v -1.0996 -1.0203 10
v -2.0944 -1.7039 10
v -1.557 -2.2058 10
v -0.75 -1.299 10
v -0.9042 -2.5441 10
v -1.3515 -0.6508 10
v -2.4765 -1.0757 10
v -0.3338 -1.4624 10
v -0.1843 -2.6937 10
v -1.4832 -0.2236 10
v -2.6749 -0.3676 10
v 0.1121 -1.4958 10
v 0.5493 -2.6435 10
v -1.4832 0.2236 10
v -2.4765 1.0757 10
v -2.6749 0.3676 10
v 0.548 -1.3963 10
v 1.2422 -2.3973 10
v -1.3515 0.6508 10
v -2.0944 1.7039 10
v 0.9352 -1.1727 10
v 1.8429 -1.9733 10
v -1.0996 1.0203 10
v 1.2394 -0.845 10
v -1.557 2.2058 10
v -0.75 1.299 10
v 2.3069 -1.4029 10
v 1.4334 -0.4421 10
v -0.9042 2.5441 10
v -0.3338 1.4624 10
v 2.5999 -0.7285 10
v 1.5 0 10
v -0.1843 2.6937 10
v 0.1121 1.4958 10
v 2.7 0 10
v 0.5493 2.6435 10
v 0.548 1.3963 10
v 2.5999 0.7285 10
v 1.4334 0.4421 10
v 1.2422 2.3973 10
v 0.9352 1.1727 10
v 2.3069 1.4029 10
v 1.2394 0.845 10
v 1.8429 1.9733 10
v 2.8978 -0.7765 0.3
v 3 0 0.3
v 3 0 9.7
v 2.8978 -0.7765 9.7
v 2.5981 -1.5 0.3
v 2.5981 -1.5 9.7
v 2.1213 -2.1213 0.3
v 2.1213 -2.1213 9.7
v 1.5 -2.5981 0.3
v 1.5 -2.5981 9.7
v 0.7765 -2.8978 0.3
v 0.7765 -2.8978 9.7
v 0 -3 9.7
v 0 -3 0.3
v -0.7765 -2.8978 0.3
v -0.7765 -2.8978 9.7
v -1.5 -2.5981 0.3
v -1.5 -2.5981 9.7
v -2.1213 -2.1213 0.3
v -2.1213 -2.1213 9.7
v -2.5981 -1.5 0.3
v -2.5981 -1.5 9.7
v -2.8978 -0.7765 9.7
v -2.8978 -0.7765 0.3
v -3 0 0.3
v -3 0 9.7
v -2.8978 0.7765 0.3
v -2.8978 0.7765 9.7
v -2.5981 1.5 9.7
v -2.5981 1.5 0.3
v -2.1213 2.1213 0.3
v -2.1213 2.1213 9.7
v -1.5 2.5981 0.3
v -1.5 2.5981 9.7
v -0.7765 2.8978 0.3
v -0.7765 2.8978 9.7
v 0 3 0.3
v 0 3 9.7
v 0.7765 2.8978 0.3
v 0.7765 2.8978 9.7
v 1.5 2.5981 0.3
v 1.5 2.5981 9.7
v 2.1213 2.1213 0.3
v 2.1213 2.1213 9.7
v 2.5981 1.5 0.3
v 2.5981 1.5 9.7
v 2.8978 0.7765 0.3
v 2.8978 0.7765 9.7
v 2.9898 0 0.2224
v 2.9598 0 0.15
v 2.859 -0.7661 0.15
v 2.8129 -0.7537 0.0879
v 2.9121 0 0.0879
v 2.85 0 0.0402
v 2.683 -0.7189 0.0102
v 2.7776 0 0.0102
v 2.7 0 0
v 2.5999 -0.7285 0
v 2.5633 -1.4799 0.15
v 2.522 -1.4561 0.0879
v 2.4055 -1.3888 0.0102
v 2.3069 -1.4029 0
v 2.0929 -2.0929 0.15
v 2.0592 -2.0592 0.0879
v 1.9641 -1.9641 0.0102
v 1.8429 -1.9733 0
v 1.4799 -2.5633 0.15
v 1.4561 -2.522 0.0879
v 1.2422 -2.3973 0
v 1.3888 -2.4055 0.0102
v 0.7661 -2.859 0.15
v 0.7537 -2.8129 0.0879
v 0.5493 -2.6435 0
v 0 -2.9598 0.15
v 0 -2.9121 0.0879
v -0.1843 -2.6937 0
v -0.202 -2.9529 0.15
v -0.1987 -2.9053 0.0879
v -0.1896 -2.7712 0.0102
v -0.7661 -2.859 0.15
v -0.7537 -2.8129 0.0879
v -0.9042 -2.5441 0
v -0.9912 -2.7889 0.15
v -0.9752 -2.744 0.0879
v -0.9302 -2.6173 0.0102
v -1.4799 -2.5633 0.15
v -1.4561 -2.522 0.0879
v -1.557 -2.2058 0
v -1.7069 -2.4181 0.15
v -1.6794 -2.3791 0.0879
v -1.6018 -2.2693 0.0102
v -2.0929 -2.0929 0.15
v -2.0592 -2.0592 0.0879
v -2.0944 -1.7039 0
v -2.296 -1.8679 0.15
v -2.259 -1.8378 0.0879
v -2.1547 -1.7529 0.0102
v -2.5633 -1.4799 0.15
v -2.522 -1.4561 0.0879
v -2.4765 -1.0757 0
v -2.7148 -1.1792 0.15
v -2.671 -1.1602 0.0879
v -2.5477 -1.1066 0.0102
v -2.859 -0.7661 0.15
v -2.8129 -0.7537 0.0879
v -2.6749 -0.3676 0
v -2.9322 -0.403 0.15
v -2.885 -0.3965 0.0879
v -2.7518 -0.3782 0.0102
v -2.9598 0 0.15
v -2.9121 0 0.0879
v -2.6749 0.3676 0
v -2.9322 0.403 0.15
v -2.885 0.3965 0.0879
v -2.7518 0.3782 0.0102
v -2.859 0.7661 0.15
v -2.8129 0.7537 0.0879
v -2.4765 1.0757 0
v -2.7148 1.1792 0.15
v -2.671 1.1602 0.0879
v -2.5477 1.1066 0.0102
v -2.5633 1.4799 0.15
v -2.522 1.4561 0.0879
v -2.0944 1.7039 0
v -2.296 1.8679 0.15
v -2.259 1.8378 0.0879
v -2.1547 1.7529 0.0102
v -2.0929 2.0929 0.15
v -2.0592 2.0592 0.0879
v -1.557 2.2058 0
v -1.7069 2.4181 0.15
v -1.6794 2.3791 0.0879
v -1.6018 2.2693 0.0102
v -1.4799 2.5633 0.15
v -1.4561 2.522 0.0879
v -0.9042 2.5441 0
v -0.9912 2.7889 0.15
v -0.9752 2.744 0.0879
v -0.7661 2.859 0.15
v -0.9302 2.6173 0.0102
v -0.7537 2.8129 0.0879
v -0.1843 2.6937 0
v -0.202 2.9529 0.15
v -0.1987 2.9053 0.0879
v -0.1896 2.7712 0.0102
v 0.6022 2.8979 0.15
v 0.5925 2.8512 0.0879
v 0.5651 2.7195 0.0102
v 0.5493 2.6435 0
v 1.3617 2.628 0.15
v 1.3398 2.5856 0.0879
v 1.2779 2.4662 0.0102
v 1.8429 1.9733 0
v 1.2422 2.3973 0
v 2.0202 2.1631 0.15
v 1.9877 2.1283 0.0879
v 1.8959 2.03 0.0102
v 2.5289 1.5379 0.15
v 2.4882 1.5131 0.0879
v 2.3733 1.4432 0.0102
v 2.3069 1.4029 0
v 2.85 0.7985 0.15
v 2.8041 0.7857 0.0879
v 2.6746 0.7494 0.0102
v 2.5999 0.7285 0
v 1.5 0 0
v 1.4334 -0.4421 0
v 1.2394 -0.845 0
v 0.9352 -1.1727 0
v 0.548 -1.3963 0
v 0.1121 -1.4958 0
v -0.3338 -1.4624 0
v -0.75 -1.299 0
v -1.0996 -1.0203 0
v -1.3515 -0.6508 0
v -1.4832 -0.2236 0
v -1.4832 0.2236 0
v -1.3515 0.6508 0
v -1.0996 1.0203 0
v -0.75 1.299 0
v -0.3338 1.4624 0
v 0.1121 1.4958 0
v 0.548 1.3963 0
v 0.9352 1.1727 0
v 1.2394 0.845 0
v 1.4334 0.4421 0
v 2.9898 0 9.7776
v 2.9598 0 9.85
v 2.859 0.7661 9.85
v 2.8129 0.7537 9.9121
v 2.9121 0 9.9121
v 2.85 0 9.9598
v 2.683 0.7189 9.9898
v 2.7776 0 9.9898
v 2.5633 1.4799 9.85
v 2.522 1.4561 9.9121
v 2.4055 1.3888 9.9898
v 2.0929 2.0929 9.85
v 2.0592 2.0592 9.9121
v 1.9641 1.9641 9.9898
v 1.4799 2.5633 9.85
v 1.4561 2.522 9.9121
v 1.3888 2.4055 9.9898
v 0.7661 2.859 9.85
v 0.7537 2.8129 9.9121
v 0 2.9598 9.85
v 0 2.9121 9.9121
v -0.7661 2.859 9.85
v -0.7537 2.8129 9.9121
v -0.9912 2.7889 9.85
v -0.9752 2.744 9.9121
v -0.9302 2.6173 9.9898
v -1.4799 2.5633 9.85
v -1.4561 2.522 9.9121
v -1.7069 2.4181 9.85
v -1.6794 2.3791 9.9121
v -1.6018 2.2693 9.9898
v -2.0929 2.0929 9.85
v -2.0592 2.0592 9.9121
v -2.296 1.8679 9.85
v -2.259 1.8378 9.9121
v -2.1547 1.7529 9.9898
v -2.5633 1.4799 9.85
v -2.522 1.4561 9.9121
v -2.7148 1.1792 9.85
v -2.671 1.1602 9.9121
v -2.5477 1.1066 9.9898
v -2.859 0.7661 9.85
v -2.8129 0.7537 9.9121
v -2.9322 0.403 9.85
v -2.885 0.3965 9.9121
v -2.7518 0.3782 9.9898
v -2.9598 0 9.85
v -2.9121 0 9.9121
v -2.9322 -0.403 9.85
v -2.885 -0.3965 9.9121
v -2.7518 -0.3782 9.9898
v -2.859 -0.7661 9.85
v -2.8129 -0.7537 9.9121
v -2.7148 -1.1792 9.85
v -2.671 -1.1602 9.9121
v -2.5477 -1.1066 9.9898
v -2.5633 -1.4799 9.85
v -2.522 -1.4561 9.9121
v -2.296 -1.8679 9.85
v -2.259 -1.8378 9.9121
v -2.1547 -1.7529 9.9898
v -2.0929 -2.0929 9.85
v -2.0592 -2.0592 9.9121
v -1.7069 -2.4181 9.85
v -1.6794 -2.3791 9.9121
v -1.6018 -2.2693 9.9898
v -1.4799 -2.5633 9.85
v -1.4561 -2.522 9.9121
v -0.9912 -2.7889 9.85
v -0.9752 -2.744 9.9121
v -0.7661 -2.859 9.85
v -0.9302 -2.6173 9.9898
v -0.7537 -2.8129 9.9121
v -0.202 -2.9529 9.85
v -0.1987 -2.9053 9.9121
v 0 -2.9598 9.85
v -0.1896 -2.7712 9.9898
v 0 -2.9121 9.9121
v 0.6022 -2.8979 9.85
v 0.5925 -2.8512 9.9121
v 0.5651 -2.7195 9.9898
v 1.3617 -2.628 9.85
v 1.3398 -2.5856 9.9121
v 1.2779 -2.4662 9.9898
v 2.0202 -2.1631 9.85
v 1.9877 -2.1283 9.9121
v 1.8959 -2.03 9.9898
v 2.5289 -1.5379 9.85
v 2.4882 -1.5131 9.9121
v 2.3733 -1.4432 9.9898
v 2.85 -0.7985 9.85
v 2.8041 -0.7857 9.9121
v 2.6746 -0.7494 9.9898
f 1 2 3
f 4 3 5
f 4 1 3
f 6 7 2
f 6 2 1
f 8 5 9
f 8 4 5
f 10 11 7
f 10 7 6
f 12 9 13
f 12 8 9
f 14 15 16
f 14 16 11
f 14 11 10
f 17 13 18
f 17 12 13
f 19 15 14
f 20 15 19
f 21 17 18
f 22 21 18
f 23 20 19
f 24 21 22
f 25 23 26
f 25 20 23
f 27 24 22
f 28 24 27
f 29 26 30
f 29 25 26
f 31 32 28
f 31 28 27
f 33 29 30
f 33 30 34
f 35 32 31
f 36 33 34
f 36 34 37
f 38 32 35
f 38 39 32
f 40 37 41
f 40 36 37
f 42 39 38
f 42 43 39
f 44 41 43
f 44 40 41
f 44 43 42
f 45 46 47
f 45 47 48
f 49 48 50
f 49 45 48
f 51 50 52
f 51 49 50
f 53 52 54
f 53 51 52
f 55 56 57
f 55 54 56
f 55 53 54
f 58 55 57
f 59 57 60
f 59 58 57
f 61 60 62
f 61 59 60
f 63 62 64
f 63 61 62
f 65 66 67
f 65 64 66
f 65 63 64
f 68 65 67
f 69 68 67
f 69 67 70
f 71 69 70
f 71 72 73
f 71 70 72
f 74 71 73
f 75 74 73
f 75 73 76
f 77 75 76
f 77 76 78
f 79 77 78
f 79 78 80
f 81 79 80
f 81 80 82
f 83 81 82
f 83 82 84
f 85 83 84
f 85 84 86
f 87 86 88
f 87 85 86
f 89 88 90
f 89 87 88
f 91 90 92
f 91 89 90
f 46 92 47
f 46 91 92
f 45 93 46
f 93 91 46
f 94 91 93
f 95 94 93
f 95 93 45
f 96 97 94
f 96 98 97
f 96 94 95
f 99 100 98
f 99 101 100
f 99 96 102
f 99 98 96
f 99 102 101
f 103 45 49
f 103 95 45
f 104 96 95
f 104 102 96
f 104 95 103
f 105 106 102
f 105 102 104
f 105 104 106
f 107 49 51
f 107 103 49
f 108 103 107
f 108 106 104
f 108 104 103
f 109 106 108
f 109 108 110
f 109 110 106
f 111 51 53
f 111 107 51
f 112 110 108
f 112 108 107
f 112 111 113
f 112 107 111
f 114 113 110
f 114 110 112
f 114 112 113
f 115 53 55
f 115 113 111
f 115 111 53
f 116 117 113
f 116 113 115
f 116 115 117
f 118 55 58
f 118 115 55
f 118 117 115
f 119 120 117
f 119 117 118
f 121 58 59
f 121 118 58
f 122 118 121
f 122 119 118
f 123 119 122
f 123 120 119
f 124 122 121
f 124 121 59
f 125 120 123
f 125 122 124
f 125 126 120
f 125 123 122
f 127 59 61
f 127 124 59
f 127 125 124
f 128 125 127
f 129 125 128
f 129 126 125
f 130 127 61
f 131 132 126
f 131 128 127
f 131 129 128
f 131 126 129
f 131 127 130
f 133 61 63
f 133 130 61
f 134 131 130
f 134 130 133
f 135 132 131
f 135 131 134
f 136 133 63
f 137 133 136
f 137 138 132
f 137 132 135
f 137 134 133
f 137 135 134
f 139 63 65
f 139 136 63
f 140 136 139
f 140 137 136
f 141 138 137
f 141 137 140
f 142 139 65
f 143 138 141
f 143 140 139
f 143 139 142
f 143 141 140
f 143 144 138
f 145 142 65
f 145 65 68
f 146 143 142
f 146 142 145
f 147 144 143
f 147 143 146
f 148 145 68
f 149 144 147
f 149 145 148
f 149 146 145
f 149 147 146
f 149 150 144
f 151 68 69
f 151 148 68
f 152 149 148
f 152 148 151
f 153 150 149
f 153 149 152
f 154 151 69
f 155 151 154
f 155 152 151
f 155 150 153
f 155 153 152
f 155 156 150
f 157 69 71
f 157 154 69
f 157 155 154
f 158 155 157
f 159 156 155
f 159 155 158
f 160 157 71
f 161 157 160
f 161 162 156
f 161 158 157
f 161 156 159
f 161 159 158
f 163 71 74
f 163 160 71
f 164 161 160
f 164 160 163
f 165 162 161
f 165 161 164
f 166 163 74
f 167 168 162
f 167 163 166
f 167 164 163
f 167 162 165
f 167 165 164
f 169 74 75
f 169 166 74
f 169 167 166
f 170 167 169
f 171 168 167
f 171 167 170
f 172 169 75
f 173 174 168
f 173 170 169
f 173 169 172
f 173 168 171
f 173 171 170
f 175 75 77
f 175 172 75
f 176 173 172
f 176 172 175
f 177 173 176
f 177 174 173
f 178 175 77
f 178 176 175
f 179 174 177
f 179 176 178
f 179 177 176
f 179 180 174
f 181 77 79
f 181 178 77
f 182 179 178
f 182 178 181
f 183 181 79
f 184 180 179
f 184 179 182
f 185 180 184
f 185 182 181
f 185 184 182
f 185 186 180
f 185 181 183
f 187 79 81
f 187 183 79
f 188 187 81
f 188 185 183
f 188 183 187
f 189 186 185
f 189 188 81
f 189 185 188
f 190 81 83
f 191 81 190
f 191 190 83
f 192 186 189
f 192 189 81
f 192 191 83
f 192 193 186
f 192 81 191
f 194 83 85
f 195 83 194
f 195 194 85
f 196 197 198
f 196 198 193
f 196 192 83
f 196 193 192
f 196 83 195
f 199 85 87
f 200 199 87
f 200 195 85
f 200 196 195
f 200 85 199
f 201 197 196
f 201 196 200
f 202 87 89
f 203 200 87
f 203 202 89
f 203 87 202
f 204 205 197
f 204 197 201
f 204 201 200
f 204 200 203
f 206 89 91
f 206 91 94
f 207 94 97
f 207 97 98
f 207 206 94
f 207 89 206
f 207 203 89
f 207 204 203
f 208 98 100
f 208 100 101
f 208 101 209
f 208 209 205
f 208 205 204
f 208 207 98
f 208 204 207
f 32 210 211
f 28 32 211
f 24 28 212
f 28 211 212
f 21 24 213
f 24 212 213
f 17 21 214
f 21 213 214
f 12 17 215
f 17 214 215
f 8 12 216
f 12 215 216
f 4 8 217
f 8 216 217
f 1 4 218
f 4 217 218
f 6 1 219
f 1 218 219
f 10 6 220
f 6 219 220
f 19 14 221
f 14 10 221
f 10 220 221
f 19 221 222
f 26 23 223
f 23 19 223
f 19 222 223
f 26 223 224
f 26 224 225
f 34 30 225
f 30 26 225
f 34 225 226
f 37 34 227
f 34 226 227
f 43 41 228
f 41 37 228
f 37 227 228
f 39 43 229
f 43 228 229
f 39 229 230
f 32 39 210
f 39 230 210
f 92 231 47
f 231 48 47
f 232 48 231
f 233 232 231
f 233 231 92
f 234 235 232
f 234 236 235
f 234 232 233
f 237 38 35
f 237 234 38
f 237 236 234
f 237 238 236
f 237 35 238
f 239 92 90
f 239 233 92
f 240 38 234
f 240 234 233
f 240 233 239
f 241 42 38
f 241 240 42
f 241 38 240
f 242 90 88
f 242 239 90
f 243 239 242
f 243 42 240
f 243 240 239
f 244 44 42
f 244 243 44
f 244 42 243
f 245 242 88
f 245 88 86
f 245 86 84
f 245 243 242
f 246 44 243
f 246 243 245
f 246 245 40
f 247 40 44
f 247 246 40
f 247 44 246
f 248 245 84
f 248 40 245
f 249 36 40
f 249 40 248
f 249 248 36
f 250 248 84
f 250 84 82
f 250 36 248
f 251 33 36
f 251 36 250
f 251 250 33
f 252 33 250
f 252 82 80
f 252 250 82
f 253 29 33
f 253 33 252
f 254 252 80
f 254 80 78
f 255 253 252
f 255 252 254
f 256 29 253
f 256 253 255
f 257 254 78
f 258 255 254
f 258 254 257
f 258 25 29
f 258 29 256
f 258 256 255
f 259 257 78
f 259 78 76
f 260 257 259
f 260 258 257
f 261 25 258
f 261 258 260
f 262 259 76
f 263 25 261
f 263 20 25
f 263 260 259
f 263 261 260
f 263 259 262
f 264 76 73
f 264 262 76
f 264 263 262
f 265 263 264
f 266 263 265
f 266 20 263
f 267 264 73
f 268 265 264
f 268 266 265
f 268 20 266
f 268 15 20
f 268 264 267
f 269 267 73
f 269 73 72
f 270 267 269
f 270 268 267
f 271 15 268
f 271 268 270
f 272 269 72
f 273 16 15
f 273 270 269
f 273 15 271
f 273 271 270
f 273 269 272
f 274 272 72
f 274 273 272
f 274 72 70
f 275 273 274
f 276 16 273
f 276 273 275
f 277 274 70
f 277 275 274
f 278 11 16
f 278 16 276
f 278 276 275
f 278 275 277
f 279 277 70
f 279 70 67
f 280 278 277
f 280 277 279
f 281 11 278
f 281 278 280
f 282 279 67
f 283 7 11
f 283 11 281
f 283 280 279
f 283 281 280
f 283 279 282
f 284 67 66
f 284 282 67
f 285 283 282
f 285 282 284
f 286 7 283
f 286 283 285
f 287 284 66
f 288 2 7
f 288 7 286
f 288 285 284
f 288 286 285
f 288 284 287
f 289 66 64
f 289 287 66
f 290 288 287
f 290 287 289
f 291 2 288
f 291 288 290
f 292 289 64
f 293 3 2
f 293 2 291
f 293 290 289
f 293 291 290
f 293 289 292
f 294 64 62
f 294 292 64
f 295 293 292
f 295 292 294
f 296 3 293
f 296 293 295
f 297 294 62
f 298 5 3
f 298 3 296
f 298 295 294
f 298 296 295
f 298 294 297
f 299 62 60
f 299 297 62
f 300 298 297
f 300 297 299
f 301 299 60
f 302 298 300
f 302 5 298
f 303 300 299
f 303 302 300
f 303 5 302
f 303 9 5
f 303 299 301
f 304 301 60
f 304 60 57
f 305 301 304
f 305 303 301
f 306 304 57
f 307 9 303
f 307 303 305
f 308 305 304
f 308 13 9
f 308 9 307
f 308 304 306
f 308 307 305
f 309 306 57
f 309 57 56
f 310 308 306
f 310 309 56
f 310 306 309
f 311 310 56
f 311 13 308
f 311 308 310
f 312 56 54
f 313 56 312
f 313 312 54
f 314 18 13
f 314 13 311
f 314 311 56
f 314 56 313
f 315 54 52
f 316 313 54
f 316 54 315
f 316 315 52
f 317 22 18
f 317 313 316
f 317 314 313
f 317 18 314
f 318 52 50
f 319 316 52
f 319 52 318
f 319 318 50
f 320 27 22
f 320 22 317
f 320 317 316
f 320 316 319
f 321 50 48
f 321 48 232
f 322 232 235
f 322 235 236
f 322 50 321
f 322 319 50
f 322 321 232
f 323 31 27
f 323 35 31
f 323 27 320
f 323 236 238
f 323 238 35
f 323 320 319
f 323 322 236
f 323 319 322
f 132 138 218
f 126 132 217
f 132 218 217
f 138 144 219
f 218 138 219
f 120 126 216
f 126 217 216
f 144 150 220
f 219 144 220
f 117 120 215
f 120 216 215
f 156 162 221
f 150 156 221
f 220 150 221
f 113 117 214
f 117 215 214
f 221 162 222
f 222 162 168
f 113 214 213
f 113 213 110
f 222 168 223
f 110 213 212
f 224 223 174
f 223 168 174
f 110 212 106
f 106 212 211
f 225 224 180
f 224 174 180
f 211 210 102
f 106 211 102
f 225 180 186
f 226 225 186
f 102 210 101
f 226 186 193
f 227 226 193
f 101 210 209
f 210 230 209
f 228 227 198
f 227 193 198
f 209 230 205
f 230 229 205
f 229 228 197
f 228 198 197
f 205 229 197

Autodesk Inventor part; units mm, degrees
ref_plane "YZ Plane" through (0, 0, 0) normal (1, 0, 0) x (0, 1, 0)
ref_plane "XZ Plane" through (0, 0, 0) normal (0, 1, 0) x (-1, 0, 0)
ref_plane "XY Plane" through (0, 0, 0) normal (0, 0, 1) x (1, 0, 0)
sketch "スケッチ1" plane through (0, 0, 0) normal (0, 0, 1) x (1, 0, 0)
  circle A0 centre (0, 0) radius 3
  circle A1 centre (0, 0) radius 1.5
  dimension "d0" = 6
  dimension "d1" = 3
extrude "押し出し1" add sketch "スケッチ1" along normal blind 10
fillet "フィレット1" radius 0.3 1 edges at (-3, 0, 10)
fillet "フィレット2" radius 0.3 1 edges at (-3, 0, 0)
thread "ねじ1" size "M3x0.5" class "6H" standard "ANSI Metric M Profile" full length
properties part number "スペーサーM3L10黄銅" material "アルミニウム 2014-T4"
